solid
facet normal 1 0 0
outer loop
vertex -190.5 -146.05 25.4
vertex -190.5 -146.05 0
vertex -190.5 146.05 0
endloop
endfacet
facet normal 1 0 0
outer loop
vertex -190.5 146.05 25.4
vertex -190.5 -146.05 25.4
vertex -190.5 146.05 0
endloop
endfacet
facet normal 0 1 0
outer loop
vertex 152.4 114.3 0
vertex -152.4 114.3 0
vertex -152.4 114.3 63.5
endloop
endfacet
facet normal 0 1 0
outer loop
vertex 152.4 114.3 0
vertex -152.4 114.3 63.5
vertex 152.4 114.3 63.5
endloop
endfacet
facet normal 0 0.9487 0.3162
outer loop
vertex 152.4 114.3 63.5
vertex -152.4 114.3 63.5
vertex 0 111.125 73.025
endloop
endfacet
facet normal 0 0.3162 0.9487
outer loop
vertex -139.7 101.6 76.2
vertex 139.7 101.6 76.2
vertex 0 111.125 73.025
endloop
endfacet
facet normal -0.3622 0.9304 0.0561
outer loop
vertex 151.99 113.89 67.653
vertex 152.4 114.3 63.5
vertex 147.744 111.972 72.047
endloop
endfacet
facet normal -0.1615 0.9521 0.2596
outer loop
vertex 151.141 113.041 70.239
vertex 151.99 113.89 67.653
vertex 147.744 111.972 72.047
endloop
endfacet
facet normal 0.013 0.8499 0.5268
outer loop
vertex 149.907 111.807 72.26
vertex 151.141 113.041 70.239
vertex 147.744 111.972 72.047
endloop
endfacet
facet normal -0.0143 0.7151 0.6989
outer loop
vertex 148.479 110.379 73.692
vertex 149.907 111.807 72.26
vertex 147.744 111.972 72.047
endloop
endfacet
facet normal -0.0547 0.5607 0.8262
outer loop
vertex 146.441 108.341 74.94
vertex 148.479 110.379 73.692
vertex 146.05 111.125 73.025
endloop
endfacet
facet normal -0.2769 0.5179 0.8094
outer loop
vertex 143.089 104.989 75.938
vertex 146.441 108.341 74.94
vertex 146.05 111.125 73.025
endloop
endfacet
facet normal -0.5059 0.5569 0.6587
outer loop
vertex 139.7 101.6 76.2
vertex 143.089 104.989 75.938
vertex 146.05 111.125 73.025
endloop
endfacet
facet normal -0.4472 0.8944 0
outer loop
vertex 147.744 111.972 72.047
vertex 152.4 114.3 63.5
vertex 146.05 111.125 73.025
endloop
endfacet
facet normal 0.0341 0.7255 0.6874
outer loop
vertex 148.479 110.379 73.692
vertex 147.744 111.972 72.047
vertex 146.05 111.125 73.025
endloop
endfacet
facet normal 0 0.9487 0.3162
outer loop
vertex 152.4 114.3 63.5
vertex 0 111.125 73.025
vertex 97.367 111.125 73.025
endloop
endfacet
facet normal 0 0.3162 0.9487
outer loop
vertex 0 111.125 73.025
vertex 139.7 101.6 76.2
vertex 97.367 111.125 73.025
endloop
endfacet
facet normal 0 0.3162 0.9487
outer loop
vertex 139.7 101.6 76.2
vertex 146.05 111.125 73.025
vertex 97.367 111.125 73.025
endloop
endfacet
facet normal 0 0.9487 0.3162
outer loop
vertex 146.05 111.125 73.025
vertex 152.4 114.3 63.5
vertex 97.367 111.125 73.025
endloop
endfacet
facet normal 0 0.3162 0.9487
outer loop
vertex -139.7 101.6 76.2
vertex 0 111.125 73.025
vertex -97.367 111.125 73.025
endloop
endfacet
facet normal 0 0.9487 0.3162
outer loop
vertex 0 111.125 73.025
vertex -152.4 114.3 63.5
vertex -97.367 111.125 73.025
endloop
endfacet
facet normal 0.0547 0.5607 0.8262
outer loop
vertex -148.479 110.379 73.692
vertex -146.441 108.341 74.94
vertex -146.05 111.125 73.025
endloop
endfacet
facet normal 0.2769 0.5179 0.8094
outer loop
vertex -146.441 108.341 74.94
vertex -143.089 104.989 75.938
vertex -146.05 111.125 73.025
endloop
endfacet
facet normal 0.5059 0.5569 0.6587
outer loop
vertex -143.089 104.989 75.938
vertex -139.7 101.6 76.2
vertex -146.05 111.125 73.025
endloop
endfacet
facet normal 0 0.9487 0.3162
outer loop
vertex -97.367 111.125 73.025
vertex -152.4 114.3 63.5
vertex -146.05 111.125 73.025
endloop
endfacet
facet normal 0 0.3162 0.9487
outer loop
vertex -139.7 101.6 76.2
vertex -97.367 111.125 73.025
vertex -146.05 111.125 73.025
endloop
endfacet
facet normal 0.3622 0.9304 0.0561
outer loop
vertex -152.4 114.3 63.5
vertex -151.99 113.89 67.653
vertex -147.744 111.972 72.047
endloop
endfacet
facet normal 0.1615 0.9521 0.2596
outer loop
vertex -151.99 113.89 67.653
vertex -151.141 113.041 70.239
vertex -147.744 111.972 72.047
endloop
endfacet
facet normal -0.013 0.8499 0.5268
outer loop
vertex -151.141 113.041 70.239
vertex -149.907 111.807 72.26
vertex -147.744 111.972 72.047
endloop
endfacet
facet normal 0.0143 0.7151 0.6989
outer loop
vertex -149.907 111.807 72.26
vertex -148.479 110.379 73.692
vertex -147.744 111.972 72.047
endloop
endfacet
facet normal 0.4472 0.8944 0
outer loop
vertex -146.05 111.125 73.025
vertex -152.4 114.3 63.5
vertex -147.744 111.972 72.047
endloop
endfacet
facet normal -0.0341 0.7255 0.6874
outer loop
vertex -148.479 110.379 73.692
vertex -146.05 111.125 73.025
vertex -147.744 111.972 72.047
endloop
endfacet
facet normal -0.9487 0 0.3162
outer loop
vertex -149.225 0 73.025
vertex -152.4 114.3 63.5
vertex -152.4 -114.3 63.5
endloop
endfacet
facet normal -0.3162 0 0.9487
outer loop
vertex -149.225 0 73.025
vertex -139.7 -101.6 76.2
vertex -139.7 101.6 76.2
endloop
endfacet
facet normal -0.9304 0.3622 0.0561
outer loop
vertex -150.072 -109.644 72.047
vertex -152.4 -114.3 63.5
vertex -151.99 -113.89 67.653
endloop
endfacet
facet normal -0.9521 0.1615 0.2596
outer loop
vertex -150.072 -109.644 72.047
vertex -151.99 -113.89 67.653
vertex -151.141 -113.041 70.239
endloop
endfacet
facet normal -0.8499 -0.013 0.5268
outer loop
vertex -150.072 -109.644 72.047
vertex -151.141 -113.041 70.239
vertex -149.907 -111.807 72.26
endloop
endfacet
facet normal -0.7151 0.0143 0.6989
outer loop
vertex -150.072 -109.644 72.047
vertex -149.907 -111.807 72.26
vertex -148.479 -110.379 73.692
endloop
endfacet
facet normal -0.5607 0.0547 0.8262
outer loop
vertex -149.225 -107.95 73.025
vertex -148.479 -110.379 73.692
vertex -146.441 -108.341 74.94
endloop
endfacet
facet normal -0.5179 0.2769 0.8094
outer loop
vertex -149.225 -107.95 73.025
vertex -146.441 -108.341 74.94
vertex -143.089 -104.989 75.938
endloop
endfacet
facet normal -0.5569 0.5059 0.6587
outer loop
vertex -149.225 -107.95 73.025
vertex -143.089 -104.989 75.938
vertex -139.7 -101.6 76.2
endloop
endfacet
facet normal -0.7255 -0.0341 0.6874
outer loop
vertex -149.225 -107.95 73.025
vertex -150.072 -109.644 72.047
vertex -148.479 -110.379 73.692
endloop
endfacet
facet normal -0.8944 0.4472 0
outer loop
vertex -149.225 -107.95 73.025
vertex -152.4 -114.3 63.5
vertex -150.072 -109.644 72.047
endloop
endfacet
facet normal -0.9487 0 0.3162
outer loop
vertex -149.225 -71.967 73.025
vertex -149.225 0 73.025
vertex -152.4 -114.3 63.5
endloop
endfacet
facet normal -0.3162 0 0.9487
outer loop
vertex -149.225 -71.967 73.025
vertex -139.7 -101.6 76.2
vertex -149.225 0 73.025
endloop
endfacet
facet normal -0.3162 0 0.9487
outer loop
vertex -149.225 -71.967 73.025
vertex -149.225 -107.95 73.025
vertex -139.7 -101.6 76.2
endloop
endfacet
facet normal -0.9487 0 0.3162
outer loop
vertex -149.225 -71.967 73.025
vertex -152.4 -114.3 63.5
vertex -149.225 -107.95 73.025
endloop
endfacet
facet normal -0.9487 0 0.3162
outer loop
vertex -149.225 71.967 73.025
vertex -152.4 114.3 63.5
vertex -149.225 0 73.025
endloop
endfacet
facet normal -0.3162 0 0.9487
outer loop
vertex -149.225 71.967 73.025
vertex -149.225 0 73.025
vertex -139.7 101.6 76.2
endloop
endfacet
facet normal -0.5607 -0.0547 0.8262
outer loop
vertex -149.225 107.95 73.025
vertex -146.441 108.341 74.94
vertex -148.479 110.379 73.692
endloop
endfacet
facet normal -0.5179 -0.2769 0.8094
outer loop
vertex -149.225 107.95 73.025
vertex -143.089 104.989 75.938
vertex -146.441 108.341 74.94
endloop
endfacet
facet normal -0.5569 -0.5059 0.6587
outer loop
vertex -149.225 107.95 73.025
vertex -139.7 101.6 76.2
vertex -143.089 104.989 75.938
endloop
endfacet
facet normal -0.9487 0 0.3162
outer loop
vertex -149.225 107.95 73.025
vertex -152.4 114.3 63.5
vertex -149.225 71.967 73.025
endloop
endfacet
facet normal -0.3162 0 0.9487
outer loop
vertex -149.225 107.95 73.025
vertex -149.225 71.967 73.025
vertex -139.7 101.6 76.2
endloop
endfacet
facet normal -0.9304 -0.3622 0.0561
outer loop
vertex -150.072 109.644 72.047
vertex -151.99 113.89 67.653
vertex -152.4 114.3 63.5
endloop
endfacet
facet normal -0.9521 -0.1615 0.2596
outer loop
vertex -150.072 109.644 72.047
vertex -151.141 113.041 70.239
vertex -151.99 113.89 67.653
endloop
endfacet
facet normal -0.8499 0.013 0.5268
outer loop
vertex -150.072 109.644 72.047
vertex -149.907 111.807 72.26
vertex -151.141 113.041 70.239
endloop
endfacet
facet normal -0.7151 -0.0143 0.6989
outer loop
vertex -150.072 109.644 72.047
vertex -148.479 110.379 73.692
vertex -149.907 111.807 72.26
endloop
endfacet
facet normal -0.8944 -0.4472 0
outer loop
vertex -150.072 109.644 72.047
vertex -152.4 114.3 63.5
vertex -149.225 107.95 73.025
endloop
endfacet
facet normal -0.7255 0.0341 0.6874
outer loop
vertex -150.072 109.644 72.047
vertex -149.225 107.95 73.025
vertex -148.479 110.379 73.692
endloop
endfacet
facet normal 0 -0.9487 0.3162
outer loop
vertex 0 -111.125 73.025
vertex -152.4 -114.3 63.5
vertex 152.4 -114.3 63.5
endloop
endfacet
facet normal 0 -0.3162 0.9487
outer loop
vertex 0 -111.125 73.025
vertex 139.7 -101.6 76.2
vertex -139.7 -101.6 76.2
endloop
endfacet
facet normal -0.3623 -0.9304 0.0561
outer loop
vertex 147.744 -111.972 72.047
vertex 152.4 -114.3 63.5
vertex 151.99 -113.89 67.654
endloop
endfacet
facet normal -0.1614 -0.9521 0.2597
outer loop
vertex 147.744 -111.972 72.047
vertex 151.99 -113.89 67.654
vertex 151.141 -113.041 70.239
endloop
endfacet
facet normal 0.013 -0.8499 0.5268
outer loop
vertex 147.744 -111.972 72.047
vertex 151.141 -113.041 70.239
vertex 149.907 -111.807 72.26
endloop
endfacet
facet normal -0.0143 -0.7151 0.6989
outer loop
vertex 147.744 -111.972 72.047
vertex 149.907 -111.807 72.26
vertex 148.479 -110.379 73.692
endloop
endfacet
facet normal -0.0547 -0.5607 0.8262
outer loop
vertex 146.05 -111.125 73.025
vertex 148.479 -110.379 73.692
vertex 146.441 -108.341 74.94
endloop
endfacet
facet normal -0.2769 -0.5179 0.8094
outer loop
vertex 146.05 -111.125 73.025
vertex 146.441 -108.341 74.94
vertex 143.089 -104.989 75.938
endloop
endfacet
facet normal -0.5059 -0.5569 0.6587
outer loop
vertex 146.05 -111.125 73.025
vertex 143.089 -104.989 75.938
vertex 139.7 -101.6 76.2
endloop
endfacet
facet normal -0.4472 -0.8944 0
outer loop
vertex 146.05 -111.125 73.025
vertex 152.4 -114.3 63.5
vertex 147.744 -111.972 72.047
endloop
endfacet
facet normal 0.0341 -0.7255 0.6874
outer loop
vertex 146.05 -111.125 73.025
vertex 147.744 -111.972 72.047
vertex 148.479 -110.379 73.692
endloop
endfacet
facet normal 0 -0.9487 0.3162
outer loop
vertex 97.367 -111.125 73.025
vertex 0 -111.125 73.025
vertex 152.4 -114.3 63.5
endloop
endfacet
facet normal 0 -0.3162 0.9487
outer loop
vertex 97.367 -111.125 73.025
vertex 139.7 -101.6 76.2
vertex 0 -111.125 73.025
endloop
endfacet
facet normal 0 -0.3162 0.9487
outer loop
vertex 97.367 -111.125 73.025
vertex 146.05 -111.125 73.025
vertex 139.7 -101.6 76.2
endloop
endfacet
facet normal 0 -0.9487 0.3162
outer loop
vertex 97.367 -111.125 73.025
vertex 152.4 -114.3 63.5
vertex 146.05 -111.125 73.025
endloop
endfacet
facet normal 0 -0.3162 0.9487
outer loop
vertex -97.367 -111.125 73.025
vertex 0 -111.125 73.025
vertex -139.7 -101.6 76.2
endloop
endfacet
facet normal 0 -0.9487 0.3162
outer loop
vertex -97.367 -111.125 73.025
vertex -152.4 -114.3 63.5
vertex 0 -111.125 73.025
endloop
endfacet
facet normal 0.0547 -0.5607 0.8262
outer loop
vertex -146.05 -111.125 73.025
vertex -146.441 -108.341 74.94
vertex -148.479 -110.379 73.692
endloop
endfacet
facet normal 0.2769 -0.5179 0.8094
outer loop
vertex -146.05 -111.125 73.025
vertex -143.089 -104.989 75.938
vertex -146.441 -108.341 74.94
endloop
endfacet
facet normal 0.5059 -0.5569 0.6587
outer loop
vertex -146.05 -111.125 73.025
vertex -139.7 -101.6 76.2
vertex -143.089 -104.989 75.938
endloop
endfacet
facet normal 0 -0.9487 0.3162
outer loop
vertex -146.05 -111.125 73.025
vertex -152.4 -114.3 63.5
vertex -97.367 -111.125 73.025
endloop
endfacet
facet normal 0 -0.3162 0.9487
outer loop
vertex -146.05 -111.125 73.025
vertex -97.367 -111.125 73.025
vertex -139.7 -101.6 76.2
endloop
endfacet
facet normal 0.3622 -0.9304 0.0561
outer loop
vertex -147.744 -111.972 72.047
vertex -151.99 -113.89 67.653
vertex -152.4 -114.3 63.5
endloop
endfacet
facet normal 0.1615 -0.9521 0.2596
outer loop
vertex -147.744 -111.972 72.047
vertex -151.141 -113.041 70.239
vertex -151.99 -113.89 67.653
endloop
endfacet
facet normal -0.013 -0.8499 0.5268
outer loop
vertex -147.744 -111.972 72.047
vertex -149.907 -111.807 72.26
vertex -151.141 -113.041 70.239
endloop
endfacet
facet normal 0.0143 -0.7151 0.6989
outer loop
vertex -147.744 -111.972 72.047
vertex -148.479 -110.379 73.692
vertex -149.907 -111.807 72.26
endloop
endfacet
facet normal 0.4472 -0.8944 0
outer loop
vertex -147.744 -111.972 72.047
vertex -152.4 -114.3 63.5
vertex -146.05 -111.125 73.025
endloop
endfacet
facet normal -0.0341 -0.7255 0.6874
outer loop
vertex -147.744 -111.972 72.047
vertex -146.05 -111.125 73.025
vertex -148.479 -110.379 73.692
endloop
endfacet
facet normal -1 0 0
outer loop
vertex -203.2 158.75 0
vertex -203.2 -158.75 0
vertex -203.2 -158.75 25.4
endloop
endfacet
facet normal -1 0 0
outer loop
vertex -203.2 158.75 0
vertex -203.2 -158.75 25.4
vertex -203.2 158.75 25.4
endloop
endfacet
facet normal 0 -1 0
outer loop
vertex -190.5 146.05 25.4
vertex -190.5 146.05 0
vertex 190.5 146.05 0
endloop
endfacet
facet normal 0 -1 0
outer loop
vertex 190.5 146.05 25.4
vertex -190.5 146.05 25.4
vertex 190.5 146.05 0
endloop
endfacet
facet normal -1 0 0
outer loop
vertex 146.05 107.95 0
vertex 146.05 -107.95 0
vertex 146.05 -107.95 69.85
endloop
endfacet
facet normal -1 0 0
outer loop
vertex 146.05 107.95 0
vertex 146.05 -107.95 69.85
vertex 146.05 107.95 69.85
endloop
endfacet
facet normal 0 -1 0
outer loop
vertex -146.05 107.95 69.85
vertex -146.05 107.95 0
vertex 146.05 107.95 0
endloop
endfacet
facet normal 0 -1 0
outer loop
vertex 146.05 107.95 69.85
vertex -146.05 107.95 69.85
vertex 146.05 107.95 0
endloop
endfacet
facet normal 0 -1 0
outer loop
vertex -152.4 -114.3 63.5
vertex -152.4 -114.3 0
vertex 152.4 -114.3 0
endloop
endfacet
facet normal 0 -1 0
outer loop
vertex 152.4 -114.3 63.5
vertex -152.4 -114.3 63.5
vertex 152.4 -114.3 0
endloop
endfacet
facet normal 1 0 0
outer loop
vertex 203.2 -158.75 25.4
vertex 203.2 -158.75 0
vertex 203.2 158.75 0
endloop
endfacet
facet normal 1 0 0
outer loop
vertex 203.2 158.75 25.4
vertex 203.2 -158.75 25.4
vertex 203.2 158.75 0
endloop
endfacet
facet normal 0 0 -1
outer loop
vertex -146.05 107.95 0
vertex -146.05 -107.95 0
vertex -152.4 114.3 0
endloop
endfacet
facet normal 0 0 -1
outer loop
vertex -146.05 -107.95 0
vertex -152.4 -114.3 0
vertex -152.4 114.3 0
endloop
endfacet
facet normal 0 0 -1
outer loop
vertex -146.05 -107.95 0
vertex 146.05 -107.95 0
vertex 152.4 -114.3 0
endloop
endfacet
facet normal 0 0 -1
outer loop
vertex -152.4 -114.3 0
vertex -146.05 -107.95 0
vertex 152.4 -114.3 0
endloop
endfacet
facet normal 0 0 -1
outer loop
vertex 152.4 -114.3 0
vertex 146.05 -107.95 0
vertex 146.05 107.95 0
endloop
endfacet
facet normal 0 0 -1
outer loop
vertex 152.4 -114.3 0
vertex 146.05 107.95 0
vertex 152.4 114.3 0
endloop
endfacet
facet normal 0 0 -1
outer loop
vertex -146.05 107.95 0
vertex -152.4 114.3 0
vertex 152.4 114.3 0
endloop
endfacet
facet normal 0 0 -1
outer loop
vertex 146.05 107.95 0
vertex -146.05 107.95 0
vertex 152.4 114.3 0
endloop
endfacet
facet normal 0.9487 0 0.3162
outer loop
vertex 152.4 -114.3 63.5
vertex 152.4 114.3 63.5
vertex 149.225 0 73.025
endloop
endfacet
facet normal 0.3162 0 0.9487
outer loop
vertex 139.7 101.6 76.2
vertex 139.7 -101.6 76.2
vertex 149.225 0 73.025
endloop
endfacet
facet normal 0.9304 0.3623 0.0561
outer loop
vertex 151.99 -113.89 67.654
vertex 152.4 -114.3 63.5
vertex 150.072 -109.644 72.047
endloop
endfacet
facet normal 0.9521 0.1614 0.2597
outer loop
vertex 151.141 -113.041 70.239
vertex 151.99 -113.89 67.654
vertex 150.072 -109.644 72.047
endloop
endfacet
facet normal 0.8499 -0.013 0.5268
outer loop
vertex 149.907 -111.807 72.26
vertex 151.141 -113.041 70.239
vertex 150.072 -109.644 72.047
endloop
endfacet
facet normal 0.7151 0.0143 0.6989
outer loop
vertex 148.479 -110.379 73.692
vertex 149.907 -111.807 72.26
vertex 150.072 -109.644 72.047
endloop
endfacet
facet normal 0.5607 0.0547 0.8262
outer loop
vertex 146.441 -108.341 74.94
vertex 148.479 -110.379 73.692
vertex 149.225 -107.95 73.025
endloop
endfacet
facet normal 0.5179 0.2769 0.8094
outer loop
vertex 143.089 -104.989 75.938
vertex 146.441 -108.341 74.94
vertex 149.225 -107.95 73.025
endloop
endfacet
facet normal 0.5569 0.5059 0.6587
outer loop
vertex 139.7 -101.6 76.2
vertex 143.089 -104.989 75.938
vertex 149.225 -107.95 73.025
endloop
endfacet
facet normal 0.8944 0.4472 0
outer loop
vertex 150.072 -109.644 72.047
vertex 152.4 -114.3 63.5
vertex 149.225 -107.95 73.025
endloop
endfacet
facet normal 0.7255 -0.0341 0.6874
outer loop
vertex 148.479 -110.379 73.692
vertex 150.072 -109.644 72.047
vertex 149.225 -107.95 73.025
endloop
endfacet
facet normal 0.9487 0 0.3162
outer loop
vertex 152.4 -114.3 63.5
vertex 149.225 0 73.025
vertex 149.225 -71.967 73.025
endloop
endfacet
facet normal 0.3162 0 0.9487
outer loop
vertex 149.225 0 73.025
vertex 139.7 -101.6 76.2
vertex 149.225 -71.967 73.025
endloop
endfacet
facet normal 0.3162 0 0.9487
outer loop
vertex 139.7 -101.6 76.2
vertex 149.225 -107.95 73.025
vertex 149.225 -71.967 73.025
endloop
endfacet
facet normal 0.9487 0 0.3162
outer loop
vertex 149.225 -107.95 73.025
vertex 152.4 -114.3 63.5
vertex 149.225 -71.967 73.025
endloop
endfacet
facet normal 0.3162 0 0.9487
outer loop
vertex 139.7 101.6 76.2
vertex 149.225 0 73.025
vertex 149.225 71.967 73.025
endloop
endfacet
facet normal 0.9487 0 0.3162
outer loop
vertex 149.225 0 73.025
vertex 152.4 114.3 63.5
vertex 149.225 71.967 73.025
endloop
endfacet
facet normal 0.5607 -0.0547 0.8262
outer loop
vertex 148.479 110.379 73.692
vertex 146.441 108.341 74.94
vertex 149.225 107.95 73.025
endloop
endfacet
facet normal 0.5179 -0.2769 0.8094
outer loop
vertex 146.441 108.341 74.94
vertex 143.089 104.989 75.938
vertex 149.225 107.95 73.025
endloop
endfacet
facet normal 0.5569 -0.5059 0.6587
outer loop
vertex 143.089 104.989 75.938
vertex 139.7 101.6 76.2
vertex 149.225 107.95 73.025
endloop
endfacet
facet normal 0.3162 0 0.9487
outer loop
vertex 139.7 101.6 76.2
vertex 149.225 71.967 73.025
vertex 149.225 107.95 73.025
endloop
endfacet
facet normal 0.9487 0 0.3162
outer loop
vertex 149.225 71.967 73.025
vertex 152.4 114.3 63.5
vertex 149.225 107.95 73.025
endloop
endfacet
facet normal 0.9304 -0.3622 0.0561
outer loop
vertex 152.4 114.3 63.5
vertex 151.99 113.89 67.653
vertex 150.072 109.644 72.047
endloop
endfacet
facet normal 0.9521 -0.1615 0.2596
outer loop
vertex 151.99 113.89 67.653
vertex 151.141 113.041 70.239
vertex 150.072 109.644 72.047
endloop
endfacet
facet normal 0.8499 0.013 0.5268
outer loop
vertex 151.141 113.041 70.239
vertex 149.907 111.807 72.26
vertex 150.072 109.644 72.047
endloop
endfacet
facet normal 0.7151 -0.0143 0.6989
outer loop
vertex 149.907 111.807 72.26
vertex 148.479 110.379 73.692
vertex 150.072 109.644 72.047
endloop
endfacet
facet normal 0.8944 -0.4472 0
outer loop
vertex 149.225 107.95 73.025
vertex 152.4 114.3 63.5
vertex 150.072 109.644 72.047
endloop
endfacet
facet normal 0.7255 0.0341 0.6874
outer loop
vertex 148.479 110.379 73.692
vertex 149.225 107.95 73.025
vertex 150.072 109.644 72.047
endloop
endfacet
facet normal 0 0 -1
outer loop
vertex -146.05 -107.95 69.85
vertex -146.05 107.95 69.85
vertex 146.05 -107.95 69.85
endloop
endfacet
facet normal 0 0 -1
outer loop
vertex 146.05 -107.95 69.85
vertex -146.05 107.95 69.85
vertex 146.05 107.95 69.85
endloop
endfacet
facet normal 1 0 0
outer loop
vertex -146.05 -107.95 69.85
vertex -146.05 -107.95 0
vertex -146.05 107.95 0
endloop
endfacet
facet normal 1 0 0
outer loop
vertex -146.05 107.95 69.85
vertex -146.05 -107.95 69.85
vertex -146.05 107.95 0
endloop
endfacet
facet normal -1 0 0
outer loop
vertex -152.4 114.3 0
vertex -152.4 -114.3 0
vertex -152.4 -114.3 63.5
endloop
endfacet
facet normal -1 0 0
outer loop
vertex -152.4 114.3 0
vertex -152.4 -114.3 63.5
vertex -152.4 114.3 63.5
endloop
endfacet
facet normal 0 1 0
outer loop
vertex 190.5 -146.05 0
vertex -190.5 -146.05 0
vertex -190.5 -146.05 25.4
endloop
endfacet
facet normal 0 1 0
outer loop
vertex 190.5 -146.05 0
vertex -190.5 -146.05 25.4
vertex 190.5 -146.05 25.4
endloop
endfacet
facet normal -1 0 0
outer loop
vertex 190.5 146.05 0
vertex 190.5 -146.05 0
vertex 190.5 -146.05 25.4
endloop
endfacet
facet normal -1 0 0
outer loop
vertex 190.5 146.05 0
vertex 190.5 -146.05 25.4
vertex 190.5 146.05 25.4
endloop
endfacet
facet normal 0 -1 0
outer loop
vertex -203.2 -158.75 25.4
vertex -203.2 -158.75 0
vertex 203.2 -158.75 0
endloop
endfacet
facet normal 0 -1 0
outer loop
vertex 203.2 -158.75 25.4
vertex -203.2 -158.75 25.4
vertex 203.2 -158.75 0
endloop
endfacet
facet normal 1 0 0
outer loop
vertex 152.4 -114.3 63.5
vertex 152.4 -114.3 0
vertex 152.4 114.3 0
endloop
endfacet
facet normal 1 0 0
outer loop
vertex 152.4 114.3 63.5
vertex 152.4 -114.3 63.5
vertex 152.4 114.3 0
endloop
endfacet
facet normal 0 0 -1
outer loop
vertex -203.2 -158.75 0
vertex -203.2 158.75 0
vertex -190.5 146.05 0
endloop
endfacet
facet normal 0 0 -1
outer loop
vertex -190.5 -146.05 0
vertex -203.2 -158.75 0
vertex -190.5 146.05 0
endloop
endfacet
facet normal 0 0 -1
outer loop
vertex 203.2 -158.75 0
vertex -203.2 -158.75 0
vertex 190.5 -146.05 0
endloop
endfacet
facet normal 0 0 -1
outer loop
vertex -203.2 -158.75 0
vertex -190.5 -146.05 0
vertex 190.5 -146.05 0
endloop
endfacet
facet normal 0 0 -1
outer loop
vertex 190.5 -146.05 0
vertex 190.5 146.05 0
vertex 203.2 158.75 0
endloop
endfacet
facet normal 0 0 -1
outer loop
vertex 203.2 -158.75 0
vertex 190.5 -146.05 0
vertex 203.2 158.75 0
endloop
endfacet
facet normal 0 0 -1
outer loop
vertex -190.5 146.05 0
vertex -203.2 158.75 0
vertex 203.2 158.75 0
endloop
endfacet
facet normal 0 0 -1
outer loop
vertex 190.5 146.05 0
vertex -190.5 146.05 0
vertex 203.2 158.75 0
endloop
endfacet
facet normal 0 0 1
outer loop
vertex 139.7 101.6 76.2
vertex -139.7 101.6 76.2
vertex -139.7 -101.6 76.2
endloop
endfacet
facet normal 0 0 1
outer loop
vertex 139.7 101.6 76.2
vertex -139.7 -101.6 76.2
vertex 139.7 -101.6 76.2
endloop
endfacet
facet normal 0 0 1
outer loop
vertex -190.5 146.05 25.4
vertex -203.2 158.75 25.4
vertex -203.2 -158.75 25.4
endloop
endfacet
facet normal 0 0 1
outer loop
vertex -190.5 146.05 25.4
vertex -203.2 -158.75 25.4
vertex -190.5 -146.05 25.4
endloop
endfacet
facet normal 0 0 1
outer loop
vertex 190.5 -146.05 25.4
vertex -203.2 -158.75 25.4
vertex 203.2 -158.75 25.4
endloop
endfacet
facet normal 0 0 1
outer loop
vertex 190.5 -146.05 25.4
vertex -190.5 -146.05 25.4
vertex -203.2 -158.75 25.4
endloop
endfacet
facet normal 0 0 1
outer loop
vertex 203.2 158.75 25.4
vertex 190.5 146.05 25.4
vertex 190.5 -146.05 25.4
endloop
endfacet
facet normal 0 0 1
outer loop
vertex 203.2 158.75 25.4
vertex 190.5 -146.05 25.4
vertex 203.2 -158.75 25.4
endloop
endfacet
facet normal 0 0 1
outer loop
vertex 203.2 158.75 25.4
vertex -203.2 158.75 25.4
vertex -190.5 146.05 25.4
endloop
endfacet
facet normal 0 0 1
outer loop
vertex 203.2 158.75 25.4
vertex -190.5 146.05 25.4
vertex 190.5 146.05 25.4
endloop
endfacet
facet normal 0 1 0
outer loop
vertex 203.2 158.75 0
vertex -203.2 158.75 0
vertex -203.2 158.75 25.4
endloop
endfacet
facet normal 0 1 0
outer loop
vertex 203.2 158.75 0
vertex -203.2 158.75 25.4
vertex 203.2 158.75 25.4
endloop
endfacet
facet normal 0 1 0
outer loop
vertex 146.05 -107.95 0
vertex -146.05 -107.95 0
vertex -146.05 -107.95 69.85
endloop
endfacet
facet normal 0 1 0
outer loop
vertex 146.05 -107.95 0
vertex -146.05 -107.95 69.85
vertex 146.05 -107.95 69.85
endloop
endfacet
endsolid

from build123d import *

# Parameters (mm, degrees)
F0_W        = 304.8
F0_H        = 228.6
F1_DEPTH    = 76.2
F2_T        = -6.35
F3_T1_DEPTH = 368.3
F3_T3_DEPTH = 292.1
F4_W        = 406.4
F4_H        = 317.5
F4_W_2      = 381
F4_H_2      = 292.1
F5_DEPTH    = 25.4


# Not quite as in the source:
# - a fillet or chamfer that OpenCascade refuses, or shapes differently, is made with other operations: its cross-section is extruded or revolved along the edge and cut away or added


with BuildPart() as f1:
    # F0 (on Top) → F1 (new body)
    with BuildSketch(Plane.XY):
        Rectangle(F0_W, F0_H)
    extrude(amount=F1_DEPTH)

    # F2
    f2_openings = [f1.faces().sort_by_distance(p)[0] for p in [
        (0, 0, 0),
    ]]
    offset(amount=F2_T, openings=f2_openings)

    # F3: fillet of radius 12.7 on 4 edges, made by hand

    # F3_s2 → F3_t1 (cut)
    with BuildSketch(Plane.YZ.offset(-184.15)):
        with BuildLine():
            add(Edge.make_bspline(
                [(-114.3, 63.5), (-114.3, 76.2), (-101.6, 76.2)],
                knots=[0, 0, 0, 1, 1, 1], degree=2, weights=[1, 1, 1]))
            Line((-101.6, 76.2), (-114.3, 76.2))
            Line((-114.3, 76.2), (-114.3, 63.5))
        make_face()
        with BuildLine():
            add(Edge.make_bspline(
                [(114.3, 63.5), (114.3, 76.2), (101.6, 76.2)],
                knots=[0, 0, 0, 1, 1, 1], degree=2, weights=[1, 1, 1]))
            Line((101.6, 76.2), (114.3, 76.2))
            Line((114.3, 76.2), (114.3, 63.5))
        make_face()
    extrude(amount=F3_T1_DEPTH, mode=Mode.SUBTRACT)

    # F3_s4 → F3_t3 (cut)
    with BuildSketch(Plane.XZ.offset(-146.05)):
        with BuildLine():
            add(Edge.make_bspline(
                [(152.4, 63.5), (152.4, 76.2), (139.7, 76.2)],
                knots=[0, 0, 0, 1, 1, 1], degree=2, weights=[1, 1, 1]))
            Line((139.7, 76.2), (152.4, 76.2))
            Line((152.4, 76.2), (152.4, 63.5))
        make_face()
        with BuildLine():
            add(Edge.make_bspline(
                [(-152.4, 63.5), (-152.4, 76.2), (-139.7, 76.2)],
                knots=[0, 0, 0, 1, 1, 1], degree=2, weights=[1, 1, 1]))
            Line((-139.7, 76.2), (-152.4, 76.2))
            Line((-152.4, 76.2), (-152.4, 63.5))
        make_face()
    extrude(amount=F3_T3_DEPTH, mode=Mode.SUBTRACT)


with BuildPart() as f5:
    # F4 (on Top) → F5 (new body)
    with BuildSketch(Plane.XY):
        Rectangle(F4_W, F4_H)
        Rectangle(F4_W_2, F4_H_2, mode=Mode.SUBTRACT)
    extrude(amount=F5_DEPTH)


solid = Compound([f1.part, f5.part])
